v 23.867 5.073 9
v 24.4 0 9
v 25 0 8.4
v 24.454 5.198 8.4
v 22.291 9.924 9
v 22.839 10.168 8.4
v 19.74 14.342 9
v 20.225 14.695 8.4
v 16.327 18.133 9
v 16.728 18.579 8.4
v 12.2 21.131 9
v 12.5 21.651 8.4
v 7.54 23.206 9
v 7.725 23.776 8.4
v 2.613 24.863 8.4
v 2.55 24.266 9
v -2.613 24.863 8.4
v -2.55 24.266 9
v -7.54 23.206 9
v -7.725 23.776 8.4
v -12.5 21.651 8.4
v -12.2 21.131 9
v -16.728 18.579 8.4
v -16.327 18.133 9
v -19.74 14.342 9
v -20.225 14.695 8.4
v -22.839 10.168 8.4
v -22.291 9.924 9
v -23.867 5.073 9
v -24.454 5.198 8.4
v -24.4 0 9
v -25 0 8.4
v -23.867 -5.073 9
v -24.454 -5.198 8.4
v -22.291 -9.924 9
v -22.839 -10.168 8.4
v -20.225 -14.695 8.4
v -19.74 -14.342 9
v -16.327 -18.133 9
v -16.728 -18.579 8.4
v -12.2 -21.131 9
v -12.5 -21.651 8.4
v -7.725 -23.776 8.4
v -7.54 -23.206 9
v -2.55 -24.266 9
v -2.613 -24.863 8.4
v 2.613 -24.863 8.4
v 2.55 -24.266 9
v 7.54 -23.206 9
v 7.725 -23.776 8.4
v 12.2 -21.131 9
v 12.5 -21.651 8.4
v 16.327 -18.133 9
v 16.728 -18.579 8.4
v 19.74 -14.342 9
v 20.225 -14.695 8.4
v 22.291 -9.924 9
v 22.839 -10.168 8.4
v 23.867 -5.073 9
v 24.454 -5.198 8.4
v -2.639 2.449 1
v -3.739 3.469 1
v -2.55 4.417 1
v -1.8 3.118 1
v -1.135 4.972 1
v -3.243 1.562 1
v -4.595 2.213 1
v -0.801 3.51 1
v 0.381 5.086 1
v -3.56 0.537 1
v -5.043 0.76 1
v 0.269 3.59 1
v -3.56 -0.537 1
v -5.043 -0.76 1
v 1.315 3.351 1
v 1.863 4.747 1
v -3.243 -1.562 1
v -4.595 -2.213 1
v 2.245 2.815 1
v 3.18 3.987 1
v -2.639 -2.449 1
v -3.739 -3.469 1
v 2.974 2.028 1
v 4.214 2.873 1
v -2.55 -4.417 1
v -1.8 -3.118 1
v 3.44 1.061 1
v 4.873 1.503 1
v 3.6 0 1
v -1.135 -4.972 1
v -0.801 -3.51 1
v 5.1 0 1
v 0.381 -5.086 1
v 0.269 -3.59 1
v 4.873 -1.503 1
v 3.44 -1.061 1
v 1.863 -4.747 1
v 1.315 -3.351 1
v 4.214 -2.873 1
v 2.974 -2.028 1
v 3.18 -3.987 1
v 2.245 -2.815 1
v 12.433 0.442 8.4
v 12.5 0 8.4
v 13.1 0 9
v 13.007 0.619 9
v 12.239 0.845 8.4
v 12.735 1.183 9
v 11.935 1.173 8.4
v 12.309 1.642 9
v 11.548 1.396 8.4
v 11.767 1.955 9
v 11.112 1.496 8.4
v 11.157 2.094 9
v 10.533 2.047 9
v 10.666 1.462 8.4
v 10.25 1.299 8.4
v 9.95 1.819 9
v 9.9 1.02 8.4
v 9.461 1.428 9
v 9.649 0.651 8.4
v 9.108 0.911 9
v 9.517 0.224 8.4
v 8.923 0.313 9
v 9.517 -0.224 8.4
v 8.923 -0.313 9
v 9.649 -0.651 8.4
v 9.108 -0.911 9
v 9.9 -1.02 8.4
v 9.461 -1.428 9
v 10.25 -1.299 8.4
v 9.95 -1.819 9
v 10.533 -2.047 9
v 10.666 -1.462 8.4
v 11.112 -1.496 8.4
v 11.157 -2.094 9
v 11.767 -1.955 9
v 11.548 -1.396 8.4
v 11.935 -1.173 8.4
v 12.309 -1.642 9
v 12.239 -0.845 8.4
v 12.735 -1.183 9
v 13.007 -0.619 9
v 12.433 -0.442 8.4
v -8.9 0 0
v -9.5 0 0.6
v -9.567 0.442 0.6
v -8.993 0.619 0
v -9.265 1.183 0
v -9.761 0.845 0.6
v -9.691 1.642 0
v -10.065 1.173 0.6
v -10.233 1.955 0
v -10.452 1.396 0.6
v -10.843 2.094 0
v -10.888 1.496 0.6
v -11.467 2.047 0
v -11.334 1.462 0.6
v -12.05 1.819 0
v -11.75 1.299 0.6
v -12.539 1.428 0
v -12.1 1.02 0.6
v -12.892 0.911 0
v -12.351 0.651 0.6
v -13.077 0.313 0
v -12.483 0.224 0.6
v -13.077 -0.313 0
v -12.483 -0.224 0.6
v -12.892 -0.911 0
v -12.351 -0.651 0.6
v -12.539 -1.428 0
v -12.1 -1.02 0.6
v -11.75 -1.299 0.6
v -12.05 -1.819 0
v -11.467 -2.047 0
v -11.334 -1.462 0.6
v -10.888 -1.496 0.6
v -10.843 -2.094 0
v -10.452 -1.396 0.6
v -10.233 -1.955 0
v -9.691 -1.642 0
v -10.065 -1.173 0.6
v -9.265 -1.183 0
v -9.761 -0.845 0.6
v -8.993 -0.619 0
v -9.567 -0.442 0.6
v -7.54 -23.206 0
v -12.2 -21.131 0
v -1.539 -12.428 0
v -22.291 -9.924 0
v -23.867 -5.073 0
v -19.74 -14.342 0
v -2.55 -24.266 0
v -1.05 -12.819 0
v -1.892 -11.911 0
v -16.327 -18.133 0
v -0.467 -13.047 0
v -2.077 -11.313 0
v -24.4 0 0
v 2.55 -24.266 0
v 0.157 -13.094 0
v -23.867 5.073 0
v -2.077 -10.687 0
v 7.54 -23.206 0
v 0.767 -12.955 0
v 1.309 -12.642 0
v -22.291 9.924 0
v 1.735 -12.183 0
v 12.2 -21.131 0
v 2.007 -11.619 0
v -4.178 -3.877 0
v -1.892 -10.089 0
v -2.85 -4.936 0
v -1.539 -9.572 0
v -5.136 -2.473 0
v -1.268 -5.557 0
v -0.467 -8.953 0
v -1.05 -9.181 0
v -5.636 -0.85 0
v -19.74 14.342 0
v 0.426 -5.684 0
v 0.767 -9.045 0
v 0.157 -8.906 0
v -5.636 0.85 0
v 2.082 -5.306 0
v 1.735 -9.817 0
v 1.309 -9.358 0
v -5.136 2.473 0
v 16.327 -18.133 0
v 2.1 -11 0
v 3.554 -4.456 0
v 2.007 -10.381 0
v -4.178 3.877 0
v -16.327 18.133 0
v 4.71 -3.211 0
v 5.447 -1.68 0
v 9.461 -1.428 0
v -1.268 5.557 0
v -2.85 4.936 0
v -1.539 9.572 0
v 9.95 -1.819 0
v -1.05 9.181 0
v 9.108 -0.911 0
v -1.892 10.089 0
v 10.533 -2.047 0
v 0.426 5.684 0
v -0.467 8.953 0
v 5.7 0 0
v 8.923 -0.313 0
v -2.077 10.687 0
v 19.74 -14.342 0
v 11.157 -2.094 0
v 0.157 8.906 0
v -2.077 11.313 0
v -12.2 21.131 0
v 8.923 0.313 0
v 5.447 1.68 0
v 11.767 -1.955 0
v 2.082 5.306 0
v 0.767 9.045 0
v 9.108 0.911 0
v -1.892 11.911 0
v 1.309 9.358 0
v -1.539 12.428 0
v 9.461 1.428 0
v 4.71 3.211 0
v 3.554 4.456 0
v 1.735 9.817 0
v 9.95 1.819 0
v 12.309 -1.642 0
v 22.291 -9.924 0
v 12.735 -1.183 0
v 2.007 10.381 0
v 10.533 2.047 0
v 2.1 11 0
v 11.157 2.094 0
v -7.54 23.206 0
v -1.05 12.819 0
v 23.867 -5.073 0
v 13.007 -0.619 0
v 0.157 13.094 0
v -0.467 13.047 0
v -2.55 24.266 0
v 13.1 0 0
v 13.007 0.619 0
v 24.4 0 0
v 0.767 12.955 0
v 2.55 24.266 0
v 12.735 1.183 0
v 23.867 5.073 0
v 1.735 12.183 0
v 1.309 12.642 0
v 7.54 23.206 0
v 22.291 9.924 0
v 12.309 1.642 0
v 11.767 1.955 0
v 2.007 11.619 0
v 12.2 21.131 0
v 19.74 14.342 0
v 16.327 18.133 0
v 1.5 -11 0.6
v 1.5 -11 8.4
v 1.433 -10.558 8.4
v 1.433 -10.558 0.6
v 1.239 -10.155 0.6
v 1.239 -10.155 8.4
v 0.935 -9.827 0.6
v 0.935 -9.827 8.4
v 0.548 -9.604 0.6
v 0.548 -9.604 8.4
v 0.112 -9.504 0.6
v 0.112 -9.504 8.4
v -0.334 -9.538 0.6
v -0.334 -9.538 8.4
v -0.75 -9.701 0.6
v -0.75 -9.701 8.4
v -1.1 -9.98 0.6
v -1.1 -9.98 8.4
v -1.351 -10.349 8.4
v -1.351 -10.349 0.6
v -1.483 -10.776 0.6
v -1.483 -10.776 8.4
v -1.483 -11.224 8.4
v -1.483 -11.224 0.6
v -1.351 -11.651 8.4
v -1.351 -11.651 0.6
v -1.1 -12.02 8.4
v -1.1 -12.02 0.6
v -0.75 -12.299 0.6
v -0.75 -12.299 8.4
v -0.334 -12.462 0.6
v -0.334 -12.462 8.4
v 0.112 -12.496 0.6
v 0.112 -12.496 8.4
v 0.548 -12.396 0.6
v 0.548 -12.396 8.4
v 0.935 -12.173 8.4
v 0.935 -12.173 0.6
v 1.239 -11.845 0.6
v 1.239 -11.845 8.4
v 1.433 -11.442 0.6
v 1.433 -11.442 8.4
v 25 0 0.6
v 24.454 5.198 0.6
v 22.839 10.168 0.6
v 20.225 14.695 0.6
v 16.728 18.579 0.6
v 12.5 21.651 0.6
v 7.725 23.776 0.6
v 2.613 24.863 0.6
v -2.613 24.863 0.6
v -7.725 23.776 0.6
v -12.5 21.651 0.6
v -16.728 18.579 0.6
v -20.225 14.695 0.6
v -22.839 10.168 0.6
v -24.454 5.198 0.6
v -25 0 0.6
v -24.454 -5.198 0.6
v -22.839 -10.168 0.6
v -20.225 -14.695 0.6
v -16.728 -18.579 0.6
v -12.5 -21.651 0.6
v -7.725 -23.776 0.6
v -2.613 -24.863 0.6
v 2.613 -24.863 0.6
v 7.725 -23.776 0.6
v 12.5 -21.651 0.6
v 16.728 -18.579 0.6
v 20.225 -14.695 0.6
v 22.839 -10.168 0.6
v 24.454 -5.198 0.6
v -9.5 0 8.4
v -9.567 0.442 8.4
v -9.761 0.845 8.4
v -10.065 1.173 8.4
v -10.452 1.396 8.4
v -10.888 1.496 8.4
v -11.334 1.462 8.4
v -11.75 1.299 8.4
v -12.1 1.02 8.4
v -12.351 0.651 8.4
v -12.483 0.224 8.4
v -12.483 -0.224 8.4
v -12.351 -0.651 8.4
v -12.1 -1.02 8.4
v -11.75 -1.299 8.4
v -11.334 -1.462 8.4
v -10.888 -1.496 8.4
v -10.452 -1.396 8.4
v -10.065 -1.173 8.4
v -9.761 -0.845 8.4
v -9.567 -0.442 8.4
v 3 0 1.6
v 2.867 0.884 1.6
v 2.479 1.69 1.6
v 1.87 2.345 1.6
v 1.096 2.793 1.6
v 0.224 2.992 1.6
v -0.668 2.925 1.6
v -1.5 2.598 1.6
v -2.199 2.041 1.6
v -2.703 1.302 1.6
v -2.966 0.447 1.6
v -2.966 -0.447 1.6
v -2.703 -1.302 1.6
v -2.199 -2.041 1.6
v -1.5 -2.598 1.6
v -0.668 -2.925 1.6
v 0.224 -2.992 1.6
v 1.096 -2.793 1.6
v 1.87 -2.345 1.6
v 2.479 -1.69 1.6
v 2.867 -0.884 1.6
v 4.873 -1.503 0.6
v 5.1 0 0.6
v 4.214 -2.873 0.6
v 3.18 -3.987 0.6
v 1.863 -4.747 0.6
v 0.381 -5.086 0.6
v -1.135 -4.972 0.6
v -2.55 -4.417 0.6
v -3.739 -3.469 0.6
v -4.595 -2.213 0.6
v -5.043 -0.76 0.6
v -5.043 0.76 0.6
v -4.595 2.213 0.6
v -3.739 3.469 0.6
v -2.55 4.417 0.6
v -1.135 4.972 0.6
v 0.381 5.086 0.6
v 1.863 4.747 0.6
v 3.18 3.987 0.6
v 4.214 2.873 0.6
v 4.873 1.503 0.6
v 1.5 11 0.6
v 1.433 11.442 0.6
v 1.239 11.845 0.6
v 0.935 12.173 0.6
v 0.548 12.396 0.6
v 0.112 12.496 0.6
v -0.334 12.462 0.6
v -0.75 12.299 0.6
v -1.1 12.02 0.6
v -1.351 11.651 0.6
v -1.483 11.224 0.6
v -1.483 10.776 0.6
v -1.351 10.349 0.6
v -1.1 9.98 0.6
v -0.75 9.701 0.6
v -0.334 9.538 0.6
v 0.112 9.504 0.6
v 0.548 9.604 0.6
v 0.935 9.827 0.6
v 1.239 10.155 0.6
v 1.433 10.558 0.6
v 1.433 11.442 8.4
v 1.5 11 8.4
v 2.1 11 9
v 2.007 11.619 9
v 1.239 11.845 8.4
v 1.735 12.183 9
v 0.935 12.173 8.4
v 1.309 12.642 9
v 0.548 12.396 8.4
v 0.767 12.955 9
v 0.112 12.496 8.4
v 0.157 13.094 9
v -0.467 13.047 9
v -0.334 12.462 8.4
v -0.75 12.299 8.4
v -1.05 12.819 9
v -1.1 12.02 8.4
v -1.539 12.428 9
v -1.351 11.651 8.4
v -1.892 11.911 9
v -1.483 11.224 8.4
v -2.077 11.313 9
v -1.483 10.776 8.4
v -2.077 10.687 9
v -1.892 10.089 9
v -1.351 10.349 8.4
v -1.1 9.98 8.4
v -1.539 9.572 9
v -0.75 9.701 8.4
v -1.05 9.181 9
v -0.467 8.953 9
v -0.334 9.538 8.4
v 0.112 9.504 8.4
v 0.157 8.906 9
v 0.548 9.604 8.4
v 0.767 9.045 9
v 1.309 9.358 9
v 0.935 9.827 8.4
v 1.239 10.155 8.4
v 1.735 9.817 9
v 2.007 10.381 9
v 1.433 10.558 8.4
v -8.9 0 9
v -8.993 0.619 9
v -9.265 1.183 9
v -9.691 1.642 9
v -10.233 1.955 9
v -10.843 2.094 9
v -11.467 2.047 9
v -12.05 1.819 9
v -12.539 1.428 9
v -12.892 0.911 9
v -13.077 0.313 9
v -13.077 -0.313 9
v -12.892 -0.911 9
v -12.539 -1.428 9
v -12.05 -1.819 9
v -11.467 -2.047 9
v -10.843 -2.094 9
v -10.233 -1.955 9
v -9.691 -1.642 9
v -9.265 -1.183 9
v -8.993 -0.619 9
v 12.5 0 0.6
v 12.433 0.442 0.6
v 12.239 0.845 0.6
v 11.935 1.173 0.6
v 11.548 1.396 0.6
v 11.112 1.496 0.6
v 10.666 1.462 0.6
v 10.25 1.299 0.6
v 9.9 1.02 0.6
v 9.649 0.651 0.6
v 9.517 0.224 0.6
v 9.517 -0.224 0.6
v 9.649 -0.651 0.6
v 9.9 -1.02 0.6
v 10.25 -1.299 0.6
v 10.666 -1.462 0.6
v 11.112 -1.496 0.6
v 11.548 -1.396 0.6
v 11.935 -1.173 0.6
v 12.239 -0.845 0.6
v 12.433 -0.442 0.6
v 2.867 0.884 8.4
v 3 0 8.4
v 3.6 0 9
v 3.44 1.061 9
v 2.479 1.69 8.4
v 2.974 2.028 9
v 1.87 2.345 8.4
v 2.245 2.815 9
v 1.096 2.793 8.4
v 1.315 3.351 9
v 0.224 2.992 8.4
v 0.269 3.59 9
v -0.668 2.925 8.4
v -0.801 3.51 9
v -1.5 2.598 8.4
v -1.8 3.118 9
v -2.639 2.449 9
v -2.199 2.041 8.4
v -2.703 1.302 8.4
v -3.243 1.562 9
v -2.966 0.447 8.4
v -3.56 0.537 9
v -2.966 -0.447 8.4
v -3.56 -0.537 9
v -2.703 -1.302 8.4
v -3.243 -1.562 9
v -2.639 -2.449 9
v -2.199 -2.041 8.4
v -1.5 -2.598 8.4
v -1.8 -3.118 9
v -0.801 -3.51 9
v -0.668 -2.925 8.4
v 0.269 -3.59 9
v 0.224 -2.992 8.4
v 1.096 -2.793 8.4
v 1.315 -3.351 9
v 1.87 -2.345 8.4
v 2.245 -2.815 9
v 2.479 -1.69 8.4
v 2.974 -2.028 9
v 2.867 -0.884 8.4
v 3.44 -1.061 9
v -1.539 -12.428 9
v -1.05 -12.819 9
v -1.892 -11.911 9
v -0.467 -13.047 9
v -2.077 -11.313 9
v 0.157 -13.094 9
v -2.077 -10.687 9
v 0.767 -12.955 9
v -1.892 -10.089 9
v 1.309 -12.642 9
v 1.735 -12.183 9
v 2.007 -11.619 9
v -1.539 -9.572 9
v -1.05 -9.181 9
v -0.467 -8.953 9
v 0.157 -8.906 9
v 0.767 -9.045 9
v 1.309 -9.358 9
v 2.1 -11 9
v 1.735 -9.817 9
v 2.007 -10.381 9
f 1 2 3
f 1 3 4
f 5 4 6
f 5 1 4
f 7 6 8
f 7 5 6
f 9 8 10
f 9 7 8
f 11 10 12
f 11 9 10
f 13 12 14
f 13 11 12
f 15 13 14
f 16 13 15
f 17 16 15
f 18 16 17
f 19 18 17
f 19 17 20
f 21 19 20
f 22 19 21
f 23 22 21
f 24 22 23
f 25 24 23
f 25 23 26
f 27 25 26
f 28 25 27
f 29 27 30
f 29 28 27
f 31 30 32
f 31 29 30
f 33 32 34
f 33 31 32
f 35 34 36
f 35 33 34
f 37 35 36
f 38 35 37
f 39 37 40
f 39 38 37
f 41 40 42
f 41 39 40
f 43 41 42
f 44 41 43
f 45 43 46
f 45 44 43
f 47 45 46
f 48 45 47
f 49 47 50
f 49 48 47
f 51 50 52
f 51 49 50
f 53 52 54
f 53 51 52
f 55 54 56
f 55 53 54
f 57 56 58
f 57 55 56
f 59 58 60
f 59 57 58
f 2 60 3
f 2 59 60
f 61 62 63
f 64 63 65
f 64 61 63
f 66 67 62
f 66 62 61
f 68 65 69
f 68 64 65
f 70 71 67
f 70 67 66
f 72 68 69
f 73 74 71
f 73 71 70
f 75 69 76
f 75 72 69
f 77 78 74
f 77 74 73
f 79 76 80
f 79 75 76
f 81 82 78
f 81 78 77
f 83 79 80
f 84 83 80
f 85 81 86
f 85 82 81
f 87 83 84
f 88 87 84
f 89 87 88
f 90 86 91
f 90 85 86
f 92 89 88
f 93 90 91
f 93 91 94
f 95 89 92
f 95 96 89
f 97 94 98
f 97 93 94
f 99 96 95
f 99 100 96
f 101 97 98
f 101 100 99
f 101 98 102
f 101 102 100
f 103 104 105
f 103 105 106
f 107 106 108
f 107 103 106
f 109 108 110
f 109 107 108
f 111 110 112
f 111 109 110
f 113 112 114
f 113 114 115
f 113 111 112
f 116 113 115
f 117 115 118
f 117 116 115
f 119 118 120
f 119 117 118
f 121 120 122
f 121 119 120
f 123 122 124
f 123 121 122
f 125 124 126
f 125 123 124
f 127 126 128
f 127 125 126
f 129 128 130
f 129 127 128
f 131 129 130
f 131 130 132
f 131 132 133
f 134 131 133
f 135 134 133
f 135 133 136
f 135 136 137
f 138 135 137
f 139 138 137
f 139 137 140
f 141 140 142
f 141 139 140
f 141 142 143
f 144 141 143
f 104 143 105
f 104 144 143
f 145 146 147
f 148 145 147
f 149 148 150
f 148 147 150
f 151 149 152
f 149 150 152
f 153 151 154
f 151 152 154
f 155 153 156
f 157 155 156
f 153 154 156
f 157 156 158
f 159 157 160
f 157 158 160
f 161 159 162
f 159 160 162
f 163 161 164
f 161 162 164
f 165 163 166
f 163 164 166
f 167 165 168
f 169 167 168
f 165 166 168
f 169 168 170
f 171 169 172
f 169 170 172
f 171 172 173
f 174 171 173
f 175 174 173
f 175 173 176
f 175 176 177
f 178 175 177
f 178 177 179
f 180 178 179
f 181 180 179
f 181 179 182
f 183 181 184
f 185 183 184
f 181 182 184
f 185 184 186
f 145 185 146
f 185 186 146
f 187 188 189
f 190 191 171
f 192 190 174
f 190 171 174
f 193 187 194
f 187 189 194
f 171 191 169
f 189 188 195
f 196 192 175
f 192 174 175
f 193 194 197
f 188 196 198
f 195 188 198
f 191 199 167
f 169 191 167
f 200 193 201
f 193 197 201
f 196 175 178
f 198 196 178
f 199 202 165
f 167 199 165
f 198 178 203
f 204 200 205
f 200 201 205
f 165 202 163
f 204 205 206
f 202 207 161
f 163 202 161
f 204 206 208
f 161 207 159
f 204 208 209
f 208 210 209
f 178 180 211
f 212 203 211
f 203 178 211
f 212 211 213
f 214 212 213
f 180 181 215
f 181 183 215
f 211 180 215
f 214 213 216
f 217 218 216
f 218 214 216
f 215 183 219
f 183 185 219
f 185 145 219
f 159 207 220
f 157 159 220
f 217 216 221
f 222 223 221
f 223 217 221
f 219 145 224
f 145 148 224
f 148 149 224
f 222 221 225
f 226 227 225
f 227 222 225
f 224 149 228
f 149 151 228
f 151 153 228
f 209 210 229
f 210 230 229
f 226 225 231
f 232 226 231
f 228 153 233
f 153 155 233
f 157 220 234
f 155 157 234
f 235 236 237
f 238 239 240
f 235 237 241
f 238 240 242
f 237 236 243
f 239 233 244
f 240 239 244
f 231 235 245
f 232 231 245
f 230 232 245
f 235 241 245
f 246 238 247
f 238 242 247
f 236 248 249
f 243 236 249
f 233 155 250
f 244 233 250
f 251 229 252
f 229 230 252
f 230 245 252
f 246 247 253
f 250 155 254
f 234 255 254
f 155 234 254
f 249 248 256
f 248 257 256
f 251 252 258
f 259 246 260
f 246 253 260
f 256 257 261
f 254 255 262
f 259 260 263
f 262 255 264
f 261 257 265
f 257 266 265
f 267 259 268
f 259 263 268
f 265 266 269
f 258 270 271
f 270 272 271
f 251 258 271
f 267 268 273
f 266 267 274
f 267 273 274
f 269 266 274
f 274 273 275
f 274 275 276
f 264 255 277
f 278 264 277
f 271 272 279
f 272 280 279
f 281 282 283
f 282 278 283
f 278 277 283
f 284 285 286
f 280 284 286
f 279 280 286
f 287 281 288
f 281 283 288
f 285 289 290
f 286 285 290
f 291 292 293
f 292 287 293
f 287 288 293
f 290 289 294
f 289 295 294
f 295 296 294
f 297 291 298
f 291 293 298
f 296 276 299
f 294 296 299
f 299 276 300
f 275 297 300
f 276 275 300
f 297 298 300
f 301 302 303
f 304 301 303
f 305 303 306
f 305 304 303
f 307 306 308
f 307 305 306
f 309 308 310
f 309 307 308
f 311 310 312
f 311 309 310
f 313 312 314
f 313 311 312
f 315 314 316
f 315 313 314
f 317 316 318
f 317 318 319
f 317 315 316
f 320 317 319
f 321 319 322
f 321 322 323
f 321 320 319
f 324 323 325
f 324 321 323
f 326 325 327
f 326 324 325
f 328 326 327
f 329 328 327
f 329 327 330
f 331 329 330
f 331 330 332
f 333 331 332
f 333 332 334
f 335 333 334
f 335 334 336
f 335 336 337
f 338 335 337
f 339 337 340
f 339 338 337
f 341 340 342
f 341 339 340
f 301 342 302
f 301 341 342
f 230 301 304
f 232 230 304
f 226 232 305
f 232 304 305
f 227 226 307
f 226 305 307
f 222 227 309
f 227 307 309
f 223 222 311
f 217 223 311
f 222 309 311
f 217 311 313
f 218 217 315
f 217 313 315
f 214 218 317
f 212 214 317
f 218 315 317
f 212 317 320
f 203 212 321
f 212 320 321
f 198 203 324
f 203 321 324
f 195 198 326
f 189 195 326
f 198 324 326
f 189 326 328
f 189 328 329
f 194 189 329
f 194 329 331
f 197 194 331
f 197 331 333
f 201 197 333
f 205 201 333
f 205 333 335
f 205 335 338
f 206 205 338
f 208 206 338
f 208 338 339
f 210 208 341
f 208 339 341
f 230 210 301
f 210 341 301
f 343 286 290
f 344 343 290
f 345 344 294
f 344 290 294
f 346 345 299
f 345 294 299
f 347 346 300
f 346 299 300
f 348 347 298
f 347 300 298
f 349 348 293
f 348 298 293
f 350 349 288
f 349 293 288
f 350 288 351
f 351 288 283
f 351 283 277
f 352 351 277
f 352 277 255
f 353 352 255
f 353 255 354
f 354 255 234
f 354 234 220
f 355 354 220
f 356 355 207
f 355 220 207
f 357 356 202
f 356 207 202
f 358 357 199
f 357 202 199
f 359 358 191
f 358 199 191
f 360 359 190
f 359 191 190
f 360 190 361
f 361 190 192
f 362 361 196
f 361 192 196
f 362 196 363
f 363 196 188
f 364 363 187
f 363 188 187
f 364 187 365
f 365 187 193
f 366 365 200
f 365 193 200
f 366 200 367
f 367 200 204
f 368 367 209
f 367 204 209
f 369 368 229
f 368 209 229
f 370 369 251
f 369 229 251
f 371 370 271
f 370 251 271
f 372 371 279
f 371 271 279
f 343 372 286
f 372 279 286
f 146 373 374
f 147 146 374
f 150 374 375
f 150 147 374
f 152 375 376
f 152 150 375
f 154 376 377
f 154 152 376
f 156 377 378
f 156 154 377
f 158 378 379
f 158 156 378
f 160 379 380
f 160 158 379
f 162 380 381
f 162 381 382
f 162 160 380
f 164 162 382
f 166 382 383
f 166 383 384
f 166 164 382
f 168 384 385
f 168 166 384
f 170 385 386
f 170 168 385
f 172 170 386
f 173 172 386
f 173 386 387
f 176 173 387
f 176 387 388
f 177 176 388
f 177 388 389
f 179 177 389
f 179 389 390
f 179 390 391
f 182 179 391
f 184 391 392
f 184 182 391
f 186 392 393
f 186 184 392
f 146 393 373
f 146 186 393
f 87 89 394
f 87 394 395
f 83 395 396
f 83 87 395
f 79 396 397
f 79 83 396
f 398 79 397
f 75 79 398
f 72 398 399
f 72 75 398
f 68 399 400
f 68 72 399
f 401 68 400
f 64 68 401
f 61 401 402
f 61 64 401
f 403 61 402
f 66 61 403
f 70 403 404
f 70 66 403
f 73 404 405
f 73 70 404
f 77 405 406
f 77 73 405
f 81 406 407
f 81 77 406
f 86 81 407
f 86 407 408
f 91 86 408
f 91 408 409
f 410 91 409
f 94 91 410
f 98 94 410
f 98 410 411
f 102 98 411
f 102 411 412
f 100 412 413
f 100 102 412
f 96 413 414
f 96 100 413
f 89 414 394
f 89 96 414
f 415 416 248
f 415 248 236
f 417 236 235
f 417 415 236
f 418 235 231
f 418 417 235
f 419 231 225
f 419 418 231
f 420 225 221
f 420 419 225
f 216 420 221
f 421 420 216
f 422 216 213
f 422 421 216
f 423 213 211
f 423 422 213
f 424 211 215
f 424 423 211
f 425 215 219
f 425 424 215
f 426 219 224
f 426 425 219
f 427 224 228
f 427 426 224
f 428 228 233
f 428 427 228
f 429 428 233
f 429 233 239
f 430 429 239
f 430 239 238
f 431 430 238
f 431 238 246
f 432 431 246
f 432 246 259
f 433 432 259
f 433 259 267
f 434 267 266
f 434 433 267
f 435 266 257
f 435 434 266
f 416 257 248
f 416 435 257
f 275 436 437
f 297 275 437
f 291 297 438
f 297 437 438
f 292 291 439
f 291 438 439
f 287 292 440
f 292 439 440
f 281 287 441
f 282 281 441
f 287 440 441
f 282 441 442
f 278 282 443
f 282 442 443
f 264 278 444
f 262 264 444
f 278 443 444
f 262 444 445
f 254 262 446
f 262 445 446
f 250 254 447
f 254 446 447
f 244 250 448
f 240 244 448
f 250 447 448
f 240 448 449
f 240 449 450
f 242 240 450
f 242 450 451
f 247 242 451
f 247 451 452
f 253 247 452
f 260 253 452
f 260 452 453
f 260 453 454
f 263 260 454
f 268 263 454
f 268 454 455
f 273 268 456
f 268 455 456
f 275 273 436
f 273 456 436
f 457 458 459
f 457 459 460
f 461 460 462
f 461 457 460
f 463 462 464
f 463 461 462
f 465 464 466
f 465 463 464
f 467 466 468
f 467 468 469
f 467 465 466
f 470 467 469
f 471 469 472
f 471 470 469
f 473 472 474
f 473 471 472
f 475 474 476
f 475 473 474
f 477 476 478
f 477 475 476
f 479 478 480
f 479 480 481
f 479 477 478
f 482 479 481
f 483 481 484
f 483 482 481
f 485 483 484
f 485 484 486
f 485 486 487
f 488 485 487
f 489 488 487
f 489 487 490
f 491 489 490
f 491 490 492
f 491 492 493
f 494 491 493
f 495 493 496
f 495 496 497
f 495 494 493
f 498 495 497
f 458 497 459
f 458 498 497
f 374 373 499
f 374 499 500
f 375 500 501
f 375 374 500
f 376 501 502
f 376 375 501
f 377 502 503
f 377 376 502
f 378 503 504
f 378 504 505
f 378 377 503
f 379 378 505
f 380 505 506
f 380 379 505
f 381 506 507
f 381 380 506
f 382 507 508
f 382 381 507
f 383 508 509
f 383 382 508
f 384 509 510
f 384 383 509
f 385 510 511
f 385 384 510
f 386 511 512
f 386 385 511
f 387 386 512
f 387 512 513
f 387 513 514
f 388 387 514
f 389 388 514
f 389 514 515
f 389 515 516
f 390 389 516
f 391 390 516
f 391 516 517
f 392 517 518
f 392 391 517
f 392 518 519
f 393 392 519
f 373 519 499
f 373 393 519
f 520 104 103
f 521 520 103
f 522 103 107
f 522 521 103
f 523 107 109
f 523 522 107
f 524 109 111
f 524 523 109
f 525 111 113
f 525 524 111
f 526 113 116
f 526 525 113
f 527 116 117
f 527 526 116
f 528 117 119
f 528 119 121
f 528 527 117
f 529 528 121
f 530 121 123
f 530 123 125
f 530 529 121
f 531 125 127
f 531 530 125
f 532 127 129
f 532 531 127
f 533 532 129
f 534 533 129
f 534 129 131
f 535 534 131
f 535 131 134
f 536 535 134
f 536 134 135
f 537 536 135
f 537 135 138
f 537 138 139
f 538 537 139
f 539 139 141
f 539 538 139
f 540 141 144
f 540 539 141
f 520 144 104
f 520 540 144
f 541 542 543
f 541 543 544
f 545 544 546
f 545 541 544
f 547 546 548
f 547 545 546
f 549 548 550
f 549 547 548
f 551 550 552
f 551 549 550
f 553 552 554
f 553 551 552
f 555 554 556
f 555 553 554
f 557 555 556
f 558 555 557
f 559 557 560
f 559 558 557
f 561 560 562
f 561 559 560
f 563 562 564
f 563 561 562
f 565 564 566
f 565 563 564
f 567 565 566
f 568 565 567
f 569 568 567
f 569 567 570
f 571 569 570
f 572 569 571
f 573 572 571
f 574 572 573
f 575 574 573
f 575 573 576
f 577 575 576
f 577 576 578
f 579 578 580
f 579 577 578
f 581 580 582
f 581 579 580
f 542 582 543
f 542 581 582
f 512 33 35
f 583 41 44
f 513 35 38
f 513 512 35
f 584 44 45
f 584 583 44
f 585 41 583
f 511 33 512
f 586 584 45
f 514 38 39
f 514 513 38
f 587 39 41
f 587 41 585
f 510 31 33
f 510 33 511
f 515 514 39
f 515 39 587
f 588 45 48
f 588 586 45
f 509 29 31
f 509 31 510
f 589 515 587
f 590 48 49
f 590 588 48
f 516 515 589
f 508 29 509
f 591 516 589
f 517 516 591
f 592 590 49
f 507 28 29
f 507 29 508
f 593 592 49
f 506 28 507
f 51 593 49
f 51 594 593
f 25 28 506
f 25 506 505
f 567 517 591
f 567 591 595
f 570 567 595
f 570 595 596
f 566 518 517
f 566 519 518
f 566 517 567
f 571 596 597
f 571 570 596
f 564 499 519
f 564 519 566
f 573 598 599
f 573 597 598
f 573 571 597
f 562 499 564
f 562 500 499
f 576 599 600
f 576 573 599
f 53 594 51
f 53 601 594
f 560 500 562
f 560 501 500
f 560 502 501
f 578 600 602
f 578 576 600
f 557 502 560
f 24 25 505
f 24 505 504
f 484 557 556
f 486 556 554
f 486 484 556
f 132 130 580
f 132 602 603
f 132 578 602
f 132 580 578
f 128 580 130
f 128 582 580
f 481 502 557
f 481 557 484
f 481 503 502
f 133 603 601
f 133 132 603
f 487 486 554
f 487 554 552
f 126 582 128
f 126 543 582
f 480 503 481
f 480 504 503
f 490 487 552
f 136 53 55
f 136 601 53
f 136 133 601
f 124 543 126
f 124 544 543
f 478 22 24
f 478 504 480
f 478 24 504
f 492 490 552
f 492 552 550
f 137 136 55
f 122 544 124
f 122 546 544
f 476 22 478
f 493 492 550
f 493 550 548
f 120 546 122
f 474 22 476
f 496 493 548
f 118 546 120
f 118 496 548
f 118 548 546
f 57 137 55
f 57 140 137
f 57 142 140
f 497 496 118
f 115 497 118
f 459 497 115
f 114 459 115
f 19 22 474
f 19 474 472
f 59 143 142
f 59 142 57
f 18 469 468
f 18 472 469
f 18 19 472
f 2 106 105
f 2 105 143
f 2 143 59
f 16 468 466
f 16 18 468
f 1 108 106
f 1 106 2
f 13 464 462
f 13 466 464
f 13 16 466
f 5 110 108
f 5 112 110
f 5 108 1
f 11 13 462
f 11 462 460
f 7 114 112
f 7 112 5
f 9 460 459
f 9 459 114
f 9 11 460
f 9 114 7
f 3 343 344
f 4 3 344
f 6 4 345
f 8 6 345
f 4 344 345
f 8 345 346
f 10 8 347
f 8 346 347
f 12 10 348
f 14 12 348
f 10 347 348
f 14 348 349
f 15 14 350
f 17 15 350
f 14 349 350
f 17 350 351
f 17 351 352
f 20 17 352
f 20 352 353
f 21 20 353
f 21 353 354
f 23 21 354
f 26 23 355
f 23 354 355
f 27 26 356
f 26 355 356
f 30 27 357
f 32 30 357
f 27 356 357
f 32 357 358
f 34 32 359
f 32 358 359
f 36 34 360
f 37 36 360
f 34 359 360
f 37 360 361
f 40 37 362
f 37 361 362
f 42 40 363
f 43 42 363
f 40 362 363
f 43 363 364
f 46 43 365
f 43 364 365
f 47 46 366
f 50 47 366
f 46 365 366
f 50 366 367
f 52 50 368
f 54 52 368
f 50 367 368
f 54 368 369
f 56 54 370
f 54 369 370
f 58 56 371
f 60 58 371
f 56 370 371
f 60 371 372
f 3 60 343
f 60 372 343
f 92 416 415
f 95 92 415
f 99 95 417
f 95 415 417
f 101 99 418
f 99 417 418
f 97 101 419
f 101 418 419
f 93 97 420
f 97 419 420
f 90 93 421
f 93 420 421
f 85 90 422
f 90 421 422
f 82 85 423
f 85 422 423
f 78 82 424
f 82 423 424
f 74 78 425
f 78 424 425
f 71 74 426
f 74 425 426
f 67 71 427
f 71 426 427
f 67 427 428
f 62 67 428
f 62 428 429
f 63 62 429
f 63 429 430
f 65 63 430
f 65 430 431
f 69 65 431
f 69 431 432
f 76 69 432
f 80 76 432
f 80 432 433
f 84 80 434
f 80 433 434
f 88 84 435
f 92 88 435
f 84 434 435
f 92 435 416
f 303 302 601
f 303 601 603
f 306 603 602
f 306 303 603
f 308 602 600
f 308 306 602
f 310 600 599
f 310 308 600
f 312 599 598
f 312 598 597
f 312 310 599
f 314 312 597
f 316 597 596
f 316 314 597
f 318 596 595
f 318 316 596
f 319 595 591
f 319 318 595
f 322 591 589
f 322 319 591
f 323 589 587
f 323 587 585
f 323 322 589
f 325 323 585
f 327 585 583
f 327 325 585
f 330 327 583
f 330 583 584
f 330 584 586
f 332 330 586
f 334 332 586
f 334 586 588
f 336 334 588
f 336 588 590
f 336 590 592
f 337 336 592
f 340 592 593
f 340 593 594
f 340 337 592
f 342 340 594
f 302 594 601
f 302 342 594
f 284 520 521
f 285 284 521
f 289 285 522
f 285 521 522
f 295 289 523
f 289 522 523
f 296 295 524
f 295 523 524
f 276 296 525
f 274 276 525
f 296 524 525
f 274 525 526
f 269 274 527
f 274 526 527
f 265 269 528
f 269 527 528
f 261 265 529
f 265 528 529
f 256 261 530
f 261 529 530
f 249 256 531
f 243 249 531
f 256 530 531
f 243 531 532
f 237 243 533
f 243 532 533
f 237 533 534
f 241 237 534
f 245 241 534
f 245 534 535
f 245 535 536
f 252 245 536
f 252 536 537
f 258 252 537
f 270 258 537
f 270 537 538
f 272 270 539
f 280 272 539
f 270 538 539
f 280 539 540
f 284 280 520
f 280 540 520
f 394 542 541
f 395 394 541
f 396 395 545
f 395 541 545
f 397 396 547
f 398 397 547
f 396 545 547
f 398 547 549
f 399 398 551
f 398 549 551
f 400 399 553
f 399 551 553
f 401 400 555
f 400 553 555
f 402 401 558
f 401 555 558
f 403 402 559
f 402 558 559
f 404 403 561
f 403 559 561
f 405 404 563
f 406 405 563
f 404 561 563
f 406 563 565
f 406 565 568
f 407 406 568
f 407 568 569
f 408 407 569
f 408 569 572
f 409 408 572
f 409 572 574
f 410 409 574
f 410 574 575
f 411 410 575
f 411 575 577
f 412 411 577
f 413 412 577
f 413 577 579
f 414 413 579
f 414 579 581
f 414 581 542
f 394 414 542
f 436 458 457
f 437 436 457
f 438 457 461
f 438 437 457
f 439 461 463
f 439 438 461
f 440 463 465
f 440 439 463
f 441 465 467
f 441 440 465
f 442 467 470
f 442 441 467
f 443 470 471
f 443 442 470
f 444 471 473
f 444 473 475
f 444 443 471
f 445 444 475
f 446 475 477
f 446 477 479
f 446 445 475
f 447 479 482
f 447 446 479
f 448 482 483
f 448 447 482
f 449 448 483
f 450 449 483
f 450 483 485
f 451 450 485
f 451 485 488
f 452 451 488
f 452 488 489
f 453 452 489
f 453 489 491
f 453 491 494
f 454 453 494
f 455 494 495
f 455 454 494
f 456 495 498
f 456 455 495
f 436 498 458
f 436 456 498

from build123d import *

# Parameters (mm, degrees)
SKETCH_R        = 25
SKETCH_R_2      = 1.5
PAD_DEPTH       = 9
SKETCH002_R     = 3
POCKET_DEPTH    = 28
SKETCH003_R     = 5.1
POCKET001_DEPTH = 1
CHAMFER_SIZE    = 0.6


with BuildPart() as part:
    # Sketch → Pad (new body)
    with BuildSketch(Plane.XY):
        Circle(SKETCH_R)
        with Locations((0, 11)):
            Circle(SKETCH_R_2, mode=Mode.SUBTRACT)
        with Locations((-11, 0)):
            Circle(SKETCH_R_2, mode=Mode.SUBTRACT)
        with Locations((0, -11)):
            Circle(SKETCH_R_2, mode=Mode.SUBTRACT)
        with Locations((11, 0)):
            Circle(SKETCH_R_2, mode=Mode.SUBTRACT)
    extrude(amount=PAD_DEPTH)

    # Sketch002 (on Face7 of Pad) → Pocket (cut)
    with BuildSketch(Plane.XY.offset(9)):
        Circle(SKETCH002_R)
    extrude(amount=-POCKET_DEPTH, mode=Mode.SUBTRACT)

    # Sketch003 (on Face2 of Pocket) → Pocket001 (cut)
    with BuildSketch(Plane(origin=(0, 0, 0), x_dir=(1, 0, 0), z_dir=(0, 0, -1))):
        Circle(SKETCH003_R)
    extrude(amount=-POCKET001_DEPTH, mode=Mode.SUBTRACT)

    # Chamfer
    chamfer_edges = [part.edges().sort_by_distance(p)[0] for p in [
        (-1.5, 11, 0),
        (-25, 0, 0),
        (9.5, 0, 0),
        (-1.5, -11, 0),
        (-12.5, 0, 0),
        (-5.1, 0, 0),
        (-3, 0, 1),
        (9.5, 0, 9),
        (-1.5, 11, 9),
        (-3, 0, 9),
        (-12.5, 0, 9),
        (-1.5, -11, 9),
        (-25, 0, 9),
    ]]
    chamfer(chamfer_edges, length=CHAMFER_SIZE)


solid = part.part
